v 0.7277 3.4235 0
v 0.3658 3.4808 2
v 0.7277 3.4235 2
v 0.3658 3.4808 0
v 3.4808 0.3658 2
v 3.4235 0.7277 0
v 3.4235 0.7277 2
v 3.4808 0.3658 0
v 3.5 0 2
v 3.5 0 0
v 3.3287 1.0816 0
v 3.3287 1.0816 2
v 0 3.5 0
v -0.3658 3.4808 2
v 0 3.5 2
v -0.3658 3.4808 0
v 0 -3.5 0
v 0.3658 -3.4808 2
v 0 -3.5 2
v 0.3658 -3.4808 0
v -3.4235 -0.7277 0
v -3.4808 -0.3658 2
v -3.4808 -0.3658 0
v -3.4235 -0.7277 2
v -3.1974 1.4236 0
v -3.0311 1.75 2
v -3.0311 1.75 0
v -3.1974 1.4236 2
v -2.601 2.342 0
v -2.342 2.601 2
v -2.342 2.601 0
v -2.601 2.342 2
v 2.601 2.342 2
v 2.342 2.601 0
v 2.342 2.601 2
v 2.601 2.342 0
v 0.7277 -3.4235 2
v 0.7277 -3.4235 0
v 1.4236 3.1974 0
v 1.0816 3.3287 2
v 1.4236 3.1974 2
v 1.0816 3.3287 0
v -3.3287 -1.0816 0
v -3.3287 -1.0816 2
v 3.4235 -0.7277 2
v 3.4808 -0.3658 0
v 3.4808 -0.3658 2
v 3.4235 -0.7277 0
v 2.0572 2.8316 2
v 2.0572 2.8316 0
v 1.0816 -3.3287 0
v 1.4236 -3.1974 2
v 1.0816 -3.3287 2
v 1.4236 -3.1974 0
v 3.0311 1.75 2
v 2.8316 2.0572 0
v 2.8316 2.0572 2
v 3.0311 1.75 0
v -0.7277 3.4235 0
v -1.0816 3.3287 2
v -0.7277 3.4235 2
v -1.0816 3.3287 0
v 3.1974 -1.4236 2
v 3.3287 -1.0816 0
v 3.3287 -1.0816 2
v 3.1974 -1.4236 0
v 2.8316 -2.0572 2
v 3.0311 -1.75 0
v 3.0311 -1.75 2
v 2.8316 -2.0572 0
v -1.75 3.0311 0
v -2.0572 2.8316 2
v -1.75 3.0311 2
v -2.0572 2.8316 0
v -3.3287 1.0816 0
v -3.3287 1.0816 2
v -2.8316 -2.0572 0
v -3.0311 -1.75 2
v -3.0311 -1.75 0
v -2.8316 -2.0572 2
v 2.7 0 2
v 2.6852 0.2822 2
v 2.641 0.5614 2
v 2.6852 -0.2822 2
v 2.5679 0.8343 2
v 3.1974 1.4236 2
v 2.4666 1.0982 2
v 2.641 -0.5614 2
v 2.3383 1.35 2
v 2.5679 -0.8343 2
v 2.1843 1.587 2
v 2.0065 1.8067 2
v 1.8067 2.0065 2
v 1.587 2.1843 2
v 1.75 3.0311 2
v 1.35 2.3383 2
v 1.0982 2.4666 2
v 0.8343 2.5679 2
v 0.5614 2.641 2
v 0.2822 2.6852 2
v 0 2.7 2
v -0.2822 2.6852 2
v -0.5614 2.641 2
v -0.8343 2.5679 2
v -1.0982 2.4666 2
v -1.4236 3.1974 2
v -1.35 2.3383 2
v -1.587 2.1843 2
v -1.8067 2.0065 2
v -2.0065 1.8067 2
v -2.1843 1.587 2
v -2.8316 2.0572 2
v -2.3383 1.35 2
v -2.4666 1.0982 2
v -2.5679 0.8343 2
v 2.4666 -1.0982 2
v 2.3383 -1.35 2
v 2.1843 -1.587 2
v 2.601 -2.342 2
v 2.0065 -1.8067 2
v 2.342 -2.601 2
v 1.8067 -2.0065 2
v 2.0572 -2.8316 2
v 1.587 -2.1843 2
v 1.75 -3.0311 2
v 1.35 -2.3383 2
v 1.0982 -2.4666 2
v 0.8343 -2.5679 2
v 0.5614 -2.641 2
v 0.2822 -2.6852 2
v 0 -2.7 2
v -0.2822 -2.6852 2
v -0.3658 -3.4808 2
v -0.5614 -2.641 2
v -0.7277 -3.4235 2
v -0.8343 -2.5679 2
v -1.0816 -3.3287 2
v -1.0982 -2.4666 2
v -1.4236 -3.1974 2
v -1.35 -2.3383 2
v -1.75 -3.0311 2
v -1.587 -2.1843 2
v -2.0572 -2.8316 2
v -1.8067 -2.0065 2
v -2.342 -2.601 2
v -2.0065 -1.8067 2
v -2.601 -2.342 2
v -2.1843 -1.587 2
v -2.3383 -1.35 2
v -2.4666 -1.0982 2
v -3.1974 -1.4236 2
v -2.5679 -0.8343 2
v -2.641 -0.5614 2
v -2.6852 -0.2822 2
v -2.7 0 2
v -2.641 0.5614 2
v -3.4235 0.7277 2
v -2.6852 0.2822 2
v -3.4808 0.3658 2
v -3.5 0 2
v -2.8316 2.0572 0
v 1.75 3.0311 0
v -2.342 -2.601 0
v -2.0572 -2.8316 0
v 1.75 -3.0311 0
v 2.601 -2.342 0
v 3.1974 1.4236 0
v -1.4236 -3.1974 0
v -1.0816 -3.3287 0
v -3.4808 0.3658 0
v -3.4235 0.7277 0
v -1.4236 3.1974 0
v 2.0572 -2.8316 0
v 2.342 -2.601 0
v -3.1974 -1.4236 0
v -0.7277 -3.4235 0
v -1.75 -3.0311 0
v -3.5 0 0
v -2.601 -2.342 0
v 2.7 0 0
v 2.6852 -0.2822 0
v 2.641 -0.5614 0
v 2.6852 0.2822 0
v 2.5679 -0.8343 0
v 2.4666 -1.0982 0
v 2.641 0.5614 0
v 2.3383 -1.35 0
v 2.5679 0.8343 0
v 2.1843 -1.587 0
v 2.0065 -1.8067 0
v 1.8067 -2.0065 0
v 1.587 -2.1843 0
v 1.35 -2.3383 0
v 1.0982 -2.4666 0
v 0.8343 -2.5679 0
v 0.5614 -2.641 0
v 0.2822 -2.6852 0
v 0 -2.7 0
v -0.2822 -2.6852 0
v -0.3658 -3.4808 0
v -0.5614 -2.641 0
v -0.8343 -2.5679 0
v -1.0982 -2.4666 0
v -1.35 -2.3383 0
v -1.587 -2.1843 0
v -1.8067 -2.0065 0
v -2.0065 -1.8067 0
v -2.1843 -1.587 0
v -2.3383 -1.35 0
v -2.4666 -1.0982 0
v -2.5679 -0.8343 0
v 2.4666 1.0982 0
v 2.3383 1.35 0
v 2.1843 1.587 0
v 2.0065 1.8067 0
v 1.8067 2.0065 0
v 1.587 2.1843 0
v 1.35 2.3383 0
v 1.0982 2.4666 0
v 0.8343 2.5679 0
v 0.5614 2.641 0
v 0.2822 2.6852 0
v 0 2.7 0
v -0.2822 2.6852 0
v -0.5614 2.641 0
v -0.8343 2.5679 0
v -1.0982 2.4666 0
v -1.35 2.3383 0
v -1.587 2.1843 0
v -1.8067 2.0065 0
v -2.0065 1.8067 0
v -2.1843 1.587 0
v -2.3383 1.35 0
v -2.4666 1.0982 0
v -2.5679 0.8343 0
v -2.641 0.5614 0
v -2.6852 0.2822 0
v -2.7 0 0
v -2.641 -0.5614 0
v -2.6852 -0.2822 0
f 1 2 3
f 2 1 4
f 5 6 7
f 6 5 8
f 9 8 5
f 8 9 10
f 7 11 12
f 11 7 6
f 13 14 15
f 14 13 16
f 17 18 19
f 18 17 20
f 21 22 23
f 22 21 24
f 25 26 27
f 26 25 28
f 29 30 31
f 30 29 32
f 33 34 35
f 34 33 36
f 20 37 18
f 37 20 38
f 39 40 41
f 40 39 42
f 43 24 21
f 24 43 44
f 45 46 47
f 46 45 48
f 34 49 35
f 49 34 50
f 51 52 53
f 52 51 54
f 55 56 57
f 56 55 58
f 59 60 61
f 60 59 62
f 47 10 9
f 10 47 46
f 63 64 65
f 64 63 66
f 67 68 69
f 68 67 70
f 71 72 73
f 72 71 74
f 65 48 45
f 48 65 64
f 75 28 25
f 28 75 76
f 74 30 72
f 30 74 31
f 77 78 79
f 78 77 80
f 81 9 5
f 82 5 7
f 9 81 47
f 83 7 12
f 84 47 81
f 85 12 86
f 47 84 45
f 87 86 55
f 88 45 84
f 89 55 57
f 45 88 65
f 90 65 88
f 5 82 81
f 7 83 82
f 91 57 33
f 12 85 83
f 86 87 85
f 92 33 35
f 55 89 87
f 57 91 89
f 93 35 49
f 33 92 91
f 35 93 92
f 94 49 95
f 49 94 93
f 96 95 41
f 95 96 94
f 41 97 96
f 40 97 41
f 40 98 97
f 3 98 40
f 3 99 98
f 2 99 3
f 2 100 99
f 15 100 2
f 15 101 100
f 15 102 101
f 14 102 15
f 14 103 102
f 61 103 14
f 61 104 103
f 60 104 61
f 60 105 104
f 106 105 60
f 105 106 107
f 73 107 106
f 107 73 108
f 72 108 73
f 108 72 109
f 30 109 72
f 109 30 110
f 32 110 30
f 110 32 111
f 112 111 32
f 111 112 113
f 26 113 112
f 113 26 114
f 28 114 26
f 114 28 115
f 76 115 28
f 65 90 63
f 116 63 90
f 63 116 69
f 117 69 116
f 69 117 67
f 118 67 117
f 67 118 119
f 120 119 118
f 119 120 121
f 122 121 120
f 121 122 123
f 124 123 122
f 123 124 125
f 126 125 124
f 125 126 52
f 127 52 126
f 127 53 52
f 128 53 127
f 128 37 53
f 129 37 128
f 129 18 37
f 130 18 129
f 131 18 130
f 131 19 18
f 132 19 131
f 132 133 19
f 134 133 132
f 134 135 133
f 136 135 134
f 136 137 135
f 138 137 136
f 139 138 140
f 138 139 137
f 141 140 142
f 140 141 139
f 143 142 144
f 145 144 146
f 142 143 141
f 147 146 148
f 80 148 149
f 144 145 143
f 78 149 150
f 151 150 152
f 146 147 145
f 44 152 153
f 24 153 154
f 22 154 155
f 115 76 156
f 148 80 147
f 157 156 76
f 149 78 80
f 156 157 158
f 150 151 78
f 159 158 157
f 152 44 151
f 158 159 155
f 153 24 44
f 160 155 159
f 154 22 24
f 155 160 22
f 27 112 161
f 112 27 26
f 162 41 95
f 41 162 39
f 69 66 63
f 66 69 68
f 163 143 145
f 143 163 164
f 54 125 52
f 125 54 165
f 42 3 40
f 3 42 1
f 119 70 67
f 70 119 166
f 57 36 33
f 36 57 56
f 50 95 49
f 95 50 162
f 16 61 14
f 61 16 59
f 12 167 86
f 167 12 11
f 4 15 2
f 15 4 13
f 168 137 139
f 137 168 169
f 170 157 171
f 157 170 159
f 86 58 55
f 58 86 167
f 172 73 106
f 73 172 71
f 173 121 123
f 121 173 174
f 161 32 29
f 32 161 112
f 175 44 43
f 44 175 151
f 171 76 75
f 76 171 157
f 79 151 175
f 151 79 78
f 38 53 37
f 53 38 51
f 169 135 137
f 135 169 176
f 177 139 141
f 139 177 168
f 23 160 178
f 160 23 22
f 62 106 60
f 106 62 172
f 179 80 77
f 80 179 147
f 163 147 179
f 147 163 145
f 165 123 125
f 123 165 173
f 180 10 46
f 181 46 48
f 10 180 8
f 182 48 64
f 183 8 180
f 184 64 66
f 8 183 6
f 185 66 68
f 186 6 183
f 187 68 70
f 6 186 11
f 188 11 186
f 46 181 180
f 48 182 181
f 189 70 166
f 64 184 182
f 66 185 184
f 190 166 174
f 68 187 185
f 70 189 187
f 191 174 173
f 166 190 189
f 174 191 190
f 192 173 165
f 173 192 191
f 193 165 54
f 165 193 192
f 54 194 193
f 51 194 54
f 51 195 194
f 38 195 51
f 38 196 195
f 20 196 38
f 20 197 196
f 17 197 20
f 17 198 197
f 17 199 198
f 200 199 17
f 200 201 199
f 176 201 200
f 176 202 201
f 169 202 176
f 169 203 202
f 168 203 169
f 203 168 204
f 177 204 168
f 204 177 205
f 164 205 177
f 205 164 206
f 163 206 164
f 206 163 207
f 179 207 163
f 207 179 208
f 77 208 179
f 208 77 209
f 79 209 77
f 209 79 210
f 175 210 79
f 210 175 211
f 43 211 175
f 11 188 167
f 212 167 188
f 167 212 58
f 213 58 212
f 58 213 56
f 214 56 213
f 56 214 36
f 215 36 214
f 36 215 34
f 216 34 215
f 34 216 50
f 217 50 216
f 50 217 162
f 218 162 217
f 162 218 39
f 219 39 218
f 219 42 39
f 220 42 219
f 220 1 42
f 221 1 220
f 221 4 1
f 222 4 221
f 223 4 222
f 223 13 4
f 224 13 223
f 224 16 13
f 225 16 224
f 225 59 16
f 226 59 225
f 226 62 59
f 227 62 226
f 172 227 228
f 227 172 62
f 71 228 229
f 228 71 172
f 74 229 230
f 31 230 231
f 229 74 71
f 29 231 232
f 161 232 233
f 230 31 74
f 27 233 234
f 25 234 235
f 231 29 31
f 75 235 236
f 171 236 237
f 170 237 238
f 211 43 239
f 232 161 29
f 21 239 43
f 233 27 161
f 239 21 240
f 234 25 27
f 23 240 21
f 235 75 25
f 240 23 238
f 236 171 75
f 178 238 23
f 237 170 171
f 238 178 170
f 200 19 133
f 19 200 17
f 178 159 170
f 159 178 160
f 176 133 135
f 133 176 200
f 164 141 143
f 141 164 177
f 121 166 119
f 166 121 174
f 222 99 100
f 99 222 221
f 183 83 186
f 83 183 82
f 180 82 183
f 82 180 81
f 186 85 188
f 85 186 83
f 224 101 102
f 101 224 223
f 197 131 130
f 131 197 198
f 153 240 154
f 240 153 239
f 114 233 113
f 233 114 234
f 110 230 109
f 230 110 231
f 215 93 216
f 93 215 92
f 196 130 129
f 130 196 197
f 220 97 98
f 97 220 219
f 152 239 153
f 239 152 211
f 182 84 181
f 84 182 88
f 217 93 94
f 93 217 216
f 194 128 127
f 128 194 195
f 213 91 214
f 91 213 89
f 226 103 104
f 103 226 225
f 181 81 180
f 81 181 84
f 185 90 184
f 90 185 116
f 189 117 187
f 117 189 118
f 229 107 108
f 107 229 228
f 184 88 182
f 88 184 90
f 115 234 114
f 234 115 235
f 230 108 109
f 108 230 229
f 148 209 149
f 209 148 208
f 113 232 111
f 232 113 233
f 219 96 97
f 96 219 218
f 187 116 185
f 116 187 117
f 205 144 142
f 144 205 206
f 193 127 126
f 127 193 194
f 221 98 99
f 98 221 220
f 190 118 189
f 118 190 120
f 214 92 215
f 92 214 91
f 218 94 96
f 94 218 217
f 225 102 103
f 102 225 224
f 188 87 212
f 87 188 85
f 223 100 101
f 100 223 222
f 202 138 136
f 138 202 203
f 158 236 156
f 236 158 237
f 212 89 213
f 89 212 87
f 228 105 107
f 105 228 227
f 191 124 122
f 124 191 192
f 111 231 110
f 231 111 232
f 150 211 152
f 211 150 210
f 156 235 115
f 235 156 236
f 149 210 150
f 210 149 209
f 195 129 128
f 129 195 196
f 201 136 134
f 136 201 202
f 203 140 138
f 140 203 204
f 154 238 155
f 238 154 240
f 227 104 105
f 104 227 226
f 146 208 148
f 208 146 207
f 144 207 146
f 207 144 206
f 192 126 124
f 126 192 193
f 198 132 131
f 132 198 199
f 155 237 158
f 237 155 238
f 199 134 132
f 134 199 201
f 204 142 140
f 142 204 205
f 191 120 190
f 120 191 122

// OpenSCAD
epaisseur_poulie = 8.5  ;
dia_ext= 7; 
dia_int = 5.4;

hauteur = 20 / 2 - epaisseur_poulie / 2 ;
hauteur = 2 ; 
$fn= 60;
module entretoise(){
        difference(){
        cylinder(h= hauteur, r = dia_ext/2);
    cylinder(h= hauteur, r = dia_int/2);
    
        }
};




entretoise();
